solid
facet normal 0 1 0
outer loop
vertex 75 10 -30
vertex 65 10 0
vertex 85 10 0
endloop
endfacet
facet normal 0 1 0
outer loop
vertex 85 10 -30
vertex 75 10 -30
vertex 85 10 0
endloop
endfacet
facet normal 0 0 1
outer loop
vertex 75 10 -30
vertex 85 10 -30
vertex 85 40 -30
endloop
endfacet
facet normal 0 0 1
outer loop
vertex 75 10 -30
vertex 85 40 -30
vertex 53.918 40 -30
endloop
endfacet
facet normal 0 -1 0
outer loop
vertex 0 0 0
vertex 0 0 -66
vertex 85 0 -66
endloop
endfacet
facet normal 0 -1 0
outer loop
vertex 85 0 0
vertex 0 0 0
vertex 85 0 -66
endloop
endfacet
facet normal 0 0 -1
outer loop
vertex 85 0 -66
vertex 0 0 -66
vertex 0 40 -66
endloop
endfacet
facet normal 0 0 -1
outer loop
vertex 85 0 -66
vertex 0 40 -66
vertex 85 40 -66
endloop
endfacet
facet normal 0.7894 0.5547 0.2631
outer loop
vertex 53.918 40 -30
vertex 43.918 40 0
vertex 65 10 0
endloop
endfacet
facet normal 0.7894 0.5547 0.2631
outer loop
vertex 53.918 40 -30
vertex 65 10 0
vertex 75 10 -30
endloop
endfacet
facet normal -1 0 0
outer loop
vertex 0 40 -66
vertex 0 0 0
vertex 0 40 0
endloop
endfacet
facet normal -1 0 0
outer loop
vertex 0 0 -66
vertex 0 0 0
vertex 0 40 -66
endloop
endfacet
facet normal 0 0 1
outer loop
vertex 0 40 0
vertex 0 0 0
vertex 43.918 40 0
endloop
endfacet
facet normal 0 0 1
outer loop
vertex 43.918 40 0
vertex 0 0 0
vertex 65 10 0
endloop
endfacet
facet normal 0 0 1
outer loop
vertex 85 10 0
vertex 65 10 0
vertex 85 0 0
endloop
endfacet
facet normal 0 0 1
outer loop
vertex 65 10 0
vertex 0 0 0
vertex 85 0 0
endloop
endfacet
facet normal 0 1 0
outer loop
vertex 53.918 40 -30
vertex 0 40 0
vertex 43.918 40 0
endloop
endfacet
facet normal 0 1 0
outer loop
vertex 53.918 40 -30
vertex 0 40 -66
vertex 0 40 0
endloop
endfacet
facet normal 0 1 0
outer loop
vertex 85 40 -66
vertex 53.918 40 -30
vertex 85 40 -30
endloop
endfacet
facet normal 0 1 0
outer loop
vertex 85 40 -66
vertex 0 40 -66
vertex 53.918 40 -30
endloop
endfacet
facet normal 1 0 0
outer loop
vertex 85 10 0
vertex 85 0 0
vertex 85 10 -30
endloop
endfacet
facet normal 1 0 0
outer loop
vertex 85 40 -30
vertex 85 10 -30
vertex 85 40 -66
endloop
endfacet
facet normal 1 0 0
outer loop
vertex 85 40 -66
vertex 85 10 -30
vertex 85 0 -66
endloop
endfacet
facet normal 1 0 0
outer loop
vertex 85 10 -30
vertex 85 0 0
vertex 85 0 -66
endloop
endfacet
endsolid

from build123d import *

# Parameters (mm, degrees)
SKETCH1_W               = 85
SKETCH1_H               = 66
BOSS_EXTRUDE1_DEPTH     = 40
CUT_EXTRUDE1_DEPTH      = 115.808536268
CUT_EXTRUDE1_DEPTH_BACK = 30
CHAMFER1_SIZE2          = 20
CHAMFER1_SIZE           = 30


with BuildPart() as part:
    # Sketch1 → Boss-Extrude1 (new body)
    with BuildSketch(Plane(origin=(0, 0, 0), x_dir=(1, 0, 0), z_dir=(0, 1, 0))):
        with Locations((42.5, 33)):
            Rectangle(SKETCH1_W, SKETCH1_H)
    extrude(amount=BOSS_EXTRUDE1_DEPTH)

    # Sketch3 → Cut-Extrude1 (cut, two sides: drawn at the far end of the back side and taken through both)
    with BuildSketch(Plane(origin=(0, 40, 0), x_dir=(1, 0, 0), z_dir=(0, 1, 0)).offset(-CUT_EXTRUDE1_DEPTH_BACK)):
        Polygon((280.267374354, 30), (85, 30), (75, 30), (65, 0), (3.251034432, -185.246896704), (242.87031101, -493.629763025), (519.886650932, -278.382866321), align=None)
    extrude(amount=CUT_EXTRUDE1_DEPTH + CUT_EXTRUDE1_DEPTH_BACK, mode=Mode.SUBTRACT)

    # Chamfer1
    chamfer1_edges = [part.edges().sort_by_distance(p)[0] for p in [
        (70, 40, -15),
    ]]
    chamfer1_side = [part.faces().sort_by_distance(p)[0] for p in [
        (70, 39.6, -15),
    ]]
    chamfer(chamfer1_edges, length=CHAMFER1_SIZE - 0.0001, length2=CHAMFER1_SIZE2 - 0.0001, reference=chamfer1_side[0])  # a hair under: the kernel refuses the full size


solid = part.part
